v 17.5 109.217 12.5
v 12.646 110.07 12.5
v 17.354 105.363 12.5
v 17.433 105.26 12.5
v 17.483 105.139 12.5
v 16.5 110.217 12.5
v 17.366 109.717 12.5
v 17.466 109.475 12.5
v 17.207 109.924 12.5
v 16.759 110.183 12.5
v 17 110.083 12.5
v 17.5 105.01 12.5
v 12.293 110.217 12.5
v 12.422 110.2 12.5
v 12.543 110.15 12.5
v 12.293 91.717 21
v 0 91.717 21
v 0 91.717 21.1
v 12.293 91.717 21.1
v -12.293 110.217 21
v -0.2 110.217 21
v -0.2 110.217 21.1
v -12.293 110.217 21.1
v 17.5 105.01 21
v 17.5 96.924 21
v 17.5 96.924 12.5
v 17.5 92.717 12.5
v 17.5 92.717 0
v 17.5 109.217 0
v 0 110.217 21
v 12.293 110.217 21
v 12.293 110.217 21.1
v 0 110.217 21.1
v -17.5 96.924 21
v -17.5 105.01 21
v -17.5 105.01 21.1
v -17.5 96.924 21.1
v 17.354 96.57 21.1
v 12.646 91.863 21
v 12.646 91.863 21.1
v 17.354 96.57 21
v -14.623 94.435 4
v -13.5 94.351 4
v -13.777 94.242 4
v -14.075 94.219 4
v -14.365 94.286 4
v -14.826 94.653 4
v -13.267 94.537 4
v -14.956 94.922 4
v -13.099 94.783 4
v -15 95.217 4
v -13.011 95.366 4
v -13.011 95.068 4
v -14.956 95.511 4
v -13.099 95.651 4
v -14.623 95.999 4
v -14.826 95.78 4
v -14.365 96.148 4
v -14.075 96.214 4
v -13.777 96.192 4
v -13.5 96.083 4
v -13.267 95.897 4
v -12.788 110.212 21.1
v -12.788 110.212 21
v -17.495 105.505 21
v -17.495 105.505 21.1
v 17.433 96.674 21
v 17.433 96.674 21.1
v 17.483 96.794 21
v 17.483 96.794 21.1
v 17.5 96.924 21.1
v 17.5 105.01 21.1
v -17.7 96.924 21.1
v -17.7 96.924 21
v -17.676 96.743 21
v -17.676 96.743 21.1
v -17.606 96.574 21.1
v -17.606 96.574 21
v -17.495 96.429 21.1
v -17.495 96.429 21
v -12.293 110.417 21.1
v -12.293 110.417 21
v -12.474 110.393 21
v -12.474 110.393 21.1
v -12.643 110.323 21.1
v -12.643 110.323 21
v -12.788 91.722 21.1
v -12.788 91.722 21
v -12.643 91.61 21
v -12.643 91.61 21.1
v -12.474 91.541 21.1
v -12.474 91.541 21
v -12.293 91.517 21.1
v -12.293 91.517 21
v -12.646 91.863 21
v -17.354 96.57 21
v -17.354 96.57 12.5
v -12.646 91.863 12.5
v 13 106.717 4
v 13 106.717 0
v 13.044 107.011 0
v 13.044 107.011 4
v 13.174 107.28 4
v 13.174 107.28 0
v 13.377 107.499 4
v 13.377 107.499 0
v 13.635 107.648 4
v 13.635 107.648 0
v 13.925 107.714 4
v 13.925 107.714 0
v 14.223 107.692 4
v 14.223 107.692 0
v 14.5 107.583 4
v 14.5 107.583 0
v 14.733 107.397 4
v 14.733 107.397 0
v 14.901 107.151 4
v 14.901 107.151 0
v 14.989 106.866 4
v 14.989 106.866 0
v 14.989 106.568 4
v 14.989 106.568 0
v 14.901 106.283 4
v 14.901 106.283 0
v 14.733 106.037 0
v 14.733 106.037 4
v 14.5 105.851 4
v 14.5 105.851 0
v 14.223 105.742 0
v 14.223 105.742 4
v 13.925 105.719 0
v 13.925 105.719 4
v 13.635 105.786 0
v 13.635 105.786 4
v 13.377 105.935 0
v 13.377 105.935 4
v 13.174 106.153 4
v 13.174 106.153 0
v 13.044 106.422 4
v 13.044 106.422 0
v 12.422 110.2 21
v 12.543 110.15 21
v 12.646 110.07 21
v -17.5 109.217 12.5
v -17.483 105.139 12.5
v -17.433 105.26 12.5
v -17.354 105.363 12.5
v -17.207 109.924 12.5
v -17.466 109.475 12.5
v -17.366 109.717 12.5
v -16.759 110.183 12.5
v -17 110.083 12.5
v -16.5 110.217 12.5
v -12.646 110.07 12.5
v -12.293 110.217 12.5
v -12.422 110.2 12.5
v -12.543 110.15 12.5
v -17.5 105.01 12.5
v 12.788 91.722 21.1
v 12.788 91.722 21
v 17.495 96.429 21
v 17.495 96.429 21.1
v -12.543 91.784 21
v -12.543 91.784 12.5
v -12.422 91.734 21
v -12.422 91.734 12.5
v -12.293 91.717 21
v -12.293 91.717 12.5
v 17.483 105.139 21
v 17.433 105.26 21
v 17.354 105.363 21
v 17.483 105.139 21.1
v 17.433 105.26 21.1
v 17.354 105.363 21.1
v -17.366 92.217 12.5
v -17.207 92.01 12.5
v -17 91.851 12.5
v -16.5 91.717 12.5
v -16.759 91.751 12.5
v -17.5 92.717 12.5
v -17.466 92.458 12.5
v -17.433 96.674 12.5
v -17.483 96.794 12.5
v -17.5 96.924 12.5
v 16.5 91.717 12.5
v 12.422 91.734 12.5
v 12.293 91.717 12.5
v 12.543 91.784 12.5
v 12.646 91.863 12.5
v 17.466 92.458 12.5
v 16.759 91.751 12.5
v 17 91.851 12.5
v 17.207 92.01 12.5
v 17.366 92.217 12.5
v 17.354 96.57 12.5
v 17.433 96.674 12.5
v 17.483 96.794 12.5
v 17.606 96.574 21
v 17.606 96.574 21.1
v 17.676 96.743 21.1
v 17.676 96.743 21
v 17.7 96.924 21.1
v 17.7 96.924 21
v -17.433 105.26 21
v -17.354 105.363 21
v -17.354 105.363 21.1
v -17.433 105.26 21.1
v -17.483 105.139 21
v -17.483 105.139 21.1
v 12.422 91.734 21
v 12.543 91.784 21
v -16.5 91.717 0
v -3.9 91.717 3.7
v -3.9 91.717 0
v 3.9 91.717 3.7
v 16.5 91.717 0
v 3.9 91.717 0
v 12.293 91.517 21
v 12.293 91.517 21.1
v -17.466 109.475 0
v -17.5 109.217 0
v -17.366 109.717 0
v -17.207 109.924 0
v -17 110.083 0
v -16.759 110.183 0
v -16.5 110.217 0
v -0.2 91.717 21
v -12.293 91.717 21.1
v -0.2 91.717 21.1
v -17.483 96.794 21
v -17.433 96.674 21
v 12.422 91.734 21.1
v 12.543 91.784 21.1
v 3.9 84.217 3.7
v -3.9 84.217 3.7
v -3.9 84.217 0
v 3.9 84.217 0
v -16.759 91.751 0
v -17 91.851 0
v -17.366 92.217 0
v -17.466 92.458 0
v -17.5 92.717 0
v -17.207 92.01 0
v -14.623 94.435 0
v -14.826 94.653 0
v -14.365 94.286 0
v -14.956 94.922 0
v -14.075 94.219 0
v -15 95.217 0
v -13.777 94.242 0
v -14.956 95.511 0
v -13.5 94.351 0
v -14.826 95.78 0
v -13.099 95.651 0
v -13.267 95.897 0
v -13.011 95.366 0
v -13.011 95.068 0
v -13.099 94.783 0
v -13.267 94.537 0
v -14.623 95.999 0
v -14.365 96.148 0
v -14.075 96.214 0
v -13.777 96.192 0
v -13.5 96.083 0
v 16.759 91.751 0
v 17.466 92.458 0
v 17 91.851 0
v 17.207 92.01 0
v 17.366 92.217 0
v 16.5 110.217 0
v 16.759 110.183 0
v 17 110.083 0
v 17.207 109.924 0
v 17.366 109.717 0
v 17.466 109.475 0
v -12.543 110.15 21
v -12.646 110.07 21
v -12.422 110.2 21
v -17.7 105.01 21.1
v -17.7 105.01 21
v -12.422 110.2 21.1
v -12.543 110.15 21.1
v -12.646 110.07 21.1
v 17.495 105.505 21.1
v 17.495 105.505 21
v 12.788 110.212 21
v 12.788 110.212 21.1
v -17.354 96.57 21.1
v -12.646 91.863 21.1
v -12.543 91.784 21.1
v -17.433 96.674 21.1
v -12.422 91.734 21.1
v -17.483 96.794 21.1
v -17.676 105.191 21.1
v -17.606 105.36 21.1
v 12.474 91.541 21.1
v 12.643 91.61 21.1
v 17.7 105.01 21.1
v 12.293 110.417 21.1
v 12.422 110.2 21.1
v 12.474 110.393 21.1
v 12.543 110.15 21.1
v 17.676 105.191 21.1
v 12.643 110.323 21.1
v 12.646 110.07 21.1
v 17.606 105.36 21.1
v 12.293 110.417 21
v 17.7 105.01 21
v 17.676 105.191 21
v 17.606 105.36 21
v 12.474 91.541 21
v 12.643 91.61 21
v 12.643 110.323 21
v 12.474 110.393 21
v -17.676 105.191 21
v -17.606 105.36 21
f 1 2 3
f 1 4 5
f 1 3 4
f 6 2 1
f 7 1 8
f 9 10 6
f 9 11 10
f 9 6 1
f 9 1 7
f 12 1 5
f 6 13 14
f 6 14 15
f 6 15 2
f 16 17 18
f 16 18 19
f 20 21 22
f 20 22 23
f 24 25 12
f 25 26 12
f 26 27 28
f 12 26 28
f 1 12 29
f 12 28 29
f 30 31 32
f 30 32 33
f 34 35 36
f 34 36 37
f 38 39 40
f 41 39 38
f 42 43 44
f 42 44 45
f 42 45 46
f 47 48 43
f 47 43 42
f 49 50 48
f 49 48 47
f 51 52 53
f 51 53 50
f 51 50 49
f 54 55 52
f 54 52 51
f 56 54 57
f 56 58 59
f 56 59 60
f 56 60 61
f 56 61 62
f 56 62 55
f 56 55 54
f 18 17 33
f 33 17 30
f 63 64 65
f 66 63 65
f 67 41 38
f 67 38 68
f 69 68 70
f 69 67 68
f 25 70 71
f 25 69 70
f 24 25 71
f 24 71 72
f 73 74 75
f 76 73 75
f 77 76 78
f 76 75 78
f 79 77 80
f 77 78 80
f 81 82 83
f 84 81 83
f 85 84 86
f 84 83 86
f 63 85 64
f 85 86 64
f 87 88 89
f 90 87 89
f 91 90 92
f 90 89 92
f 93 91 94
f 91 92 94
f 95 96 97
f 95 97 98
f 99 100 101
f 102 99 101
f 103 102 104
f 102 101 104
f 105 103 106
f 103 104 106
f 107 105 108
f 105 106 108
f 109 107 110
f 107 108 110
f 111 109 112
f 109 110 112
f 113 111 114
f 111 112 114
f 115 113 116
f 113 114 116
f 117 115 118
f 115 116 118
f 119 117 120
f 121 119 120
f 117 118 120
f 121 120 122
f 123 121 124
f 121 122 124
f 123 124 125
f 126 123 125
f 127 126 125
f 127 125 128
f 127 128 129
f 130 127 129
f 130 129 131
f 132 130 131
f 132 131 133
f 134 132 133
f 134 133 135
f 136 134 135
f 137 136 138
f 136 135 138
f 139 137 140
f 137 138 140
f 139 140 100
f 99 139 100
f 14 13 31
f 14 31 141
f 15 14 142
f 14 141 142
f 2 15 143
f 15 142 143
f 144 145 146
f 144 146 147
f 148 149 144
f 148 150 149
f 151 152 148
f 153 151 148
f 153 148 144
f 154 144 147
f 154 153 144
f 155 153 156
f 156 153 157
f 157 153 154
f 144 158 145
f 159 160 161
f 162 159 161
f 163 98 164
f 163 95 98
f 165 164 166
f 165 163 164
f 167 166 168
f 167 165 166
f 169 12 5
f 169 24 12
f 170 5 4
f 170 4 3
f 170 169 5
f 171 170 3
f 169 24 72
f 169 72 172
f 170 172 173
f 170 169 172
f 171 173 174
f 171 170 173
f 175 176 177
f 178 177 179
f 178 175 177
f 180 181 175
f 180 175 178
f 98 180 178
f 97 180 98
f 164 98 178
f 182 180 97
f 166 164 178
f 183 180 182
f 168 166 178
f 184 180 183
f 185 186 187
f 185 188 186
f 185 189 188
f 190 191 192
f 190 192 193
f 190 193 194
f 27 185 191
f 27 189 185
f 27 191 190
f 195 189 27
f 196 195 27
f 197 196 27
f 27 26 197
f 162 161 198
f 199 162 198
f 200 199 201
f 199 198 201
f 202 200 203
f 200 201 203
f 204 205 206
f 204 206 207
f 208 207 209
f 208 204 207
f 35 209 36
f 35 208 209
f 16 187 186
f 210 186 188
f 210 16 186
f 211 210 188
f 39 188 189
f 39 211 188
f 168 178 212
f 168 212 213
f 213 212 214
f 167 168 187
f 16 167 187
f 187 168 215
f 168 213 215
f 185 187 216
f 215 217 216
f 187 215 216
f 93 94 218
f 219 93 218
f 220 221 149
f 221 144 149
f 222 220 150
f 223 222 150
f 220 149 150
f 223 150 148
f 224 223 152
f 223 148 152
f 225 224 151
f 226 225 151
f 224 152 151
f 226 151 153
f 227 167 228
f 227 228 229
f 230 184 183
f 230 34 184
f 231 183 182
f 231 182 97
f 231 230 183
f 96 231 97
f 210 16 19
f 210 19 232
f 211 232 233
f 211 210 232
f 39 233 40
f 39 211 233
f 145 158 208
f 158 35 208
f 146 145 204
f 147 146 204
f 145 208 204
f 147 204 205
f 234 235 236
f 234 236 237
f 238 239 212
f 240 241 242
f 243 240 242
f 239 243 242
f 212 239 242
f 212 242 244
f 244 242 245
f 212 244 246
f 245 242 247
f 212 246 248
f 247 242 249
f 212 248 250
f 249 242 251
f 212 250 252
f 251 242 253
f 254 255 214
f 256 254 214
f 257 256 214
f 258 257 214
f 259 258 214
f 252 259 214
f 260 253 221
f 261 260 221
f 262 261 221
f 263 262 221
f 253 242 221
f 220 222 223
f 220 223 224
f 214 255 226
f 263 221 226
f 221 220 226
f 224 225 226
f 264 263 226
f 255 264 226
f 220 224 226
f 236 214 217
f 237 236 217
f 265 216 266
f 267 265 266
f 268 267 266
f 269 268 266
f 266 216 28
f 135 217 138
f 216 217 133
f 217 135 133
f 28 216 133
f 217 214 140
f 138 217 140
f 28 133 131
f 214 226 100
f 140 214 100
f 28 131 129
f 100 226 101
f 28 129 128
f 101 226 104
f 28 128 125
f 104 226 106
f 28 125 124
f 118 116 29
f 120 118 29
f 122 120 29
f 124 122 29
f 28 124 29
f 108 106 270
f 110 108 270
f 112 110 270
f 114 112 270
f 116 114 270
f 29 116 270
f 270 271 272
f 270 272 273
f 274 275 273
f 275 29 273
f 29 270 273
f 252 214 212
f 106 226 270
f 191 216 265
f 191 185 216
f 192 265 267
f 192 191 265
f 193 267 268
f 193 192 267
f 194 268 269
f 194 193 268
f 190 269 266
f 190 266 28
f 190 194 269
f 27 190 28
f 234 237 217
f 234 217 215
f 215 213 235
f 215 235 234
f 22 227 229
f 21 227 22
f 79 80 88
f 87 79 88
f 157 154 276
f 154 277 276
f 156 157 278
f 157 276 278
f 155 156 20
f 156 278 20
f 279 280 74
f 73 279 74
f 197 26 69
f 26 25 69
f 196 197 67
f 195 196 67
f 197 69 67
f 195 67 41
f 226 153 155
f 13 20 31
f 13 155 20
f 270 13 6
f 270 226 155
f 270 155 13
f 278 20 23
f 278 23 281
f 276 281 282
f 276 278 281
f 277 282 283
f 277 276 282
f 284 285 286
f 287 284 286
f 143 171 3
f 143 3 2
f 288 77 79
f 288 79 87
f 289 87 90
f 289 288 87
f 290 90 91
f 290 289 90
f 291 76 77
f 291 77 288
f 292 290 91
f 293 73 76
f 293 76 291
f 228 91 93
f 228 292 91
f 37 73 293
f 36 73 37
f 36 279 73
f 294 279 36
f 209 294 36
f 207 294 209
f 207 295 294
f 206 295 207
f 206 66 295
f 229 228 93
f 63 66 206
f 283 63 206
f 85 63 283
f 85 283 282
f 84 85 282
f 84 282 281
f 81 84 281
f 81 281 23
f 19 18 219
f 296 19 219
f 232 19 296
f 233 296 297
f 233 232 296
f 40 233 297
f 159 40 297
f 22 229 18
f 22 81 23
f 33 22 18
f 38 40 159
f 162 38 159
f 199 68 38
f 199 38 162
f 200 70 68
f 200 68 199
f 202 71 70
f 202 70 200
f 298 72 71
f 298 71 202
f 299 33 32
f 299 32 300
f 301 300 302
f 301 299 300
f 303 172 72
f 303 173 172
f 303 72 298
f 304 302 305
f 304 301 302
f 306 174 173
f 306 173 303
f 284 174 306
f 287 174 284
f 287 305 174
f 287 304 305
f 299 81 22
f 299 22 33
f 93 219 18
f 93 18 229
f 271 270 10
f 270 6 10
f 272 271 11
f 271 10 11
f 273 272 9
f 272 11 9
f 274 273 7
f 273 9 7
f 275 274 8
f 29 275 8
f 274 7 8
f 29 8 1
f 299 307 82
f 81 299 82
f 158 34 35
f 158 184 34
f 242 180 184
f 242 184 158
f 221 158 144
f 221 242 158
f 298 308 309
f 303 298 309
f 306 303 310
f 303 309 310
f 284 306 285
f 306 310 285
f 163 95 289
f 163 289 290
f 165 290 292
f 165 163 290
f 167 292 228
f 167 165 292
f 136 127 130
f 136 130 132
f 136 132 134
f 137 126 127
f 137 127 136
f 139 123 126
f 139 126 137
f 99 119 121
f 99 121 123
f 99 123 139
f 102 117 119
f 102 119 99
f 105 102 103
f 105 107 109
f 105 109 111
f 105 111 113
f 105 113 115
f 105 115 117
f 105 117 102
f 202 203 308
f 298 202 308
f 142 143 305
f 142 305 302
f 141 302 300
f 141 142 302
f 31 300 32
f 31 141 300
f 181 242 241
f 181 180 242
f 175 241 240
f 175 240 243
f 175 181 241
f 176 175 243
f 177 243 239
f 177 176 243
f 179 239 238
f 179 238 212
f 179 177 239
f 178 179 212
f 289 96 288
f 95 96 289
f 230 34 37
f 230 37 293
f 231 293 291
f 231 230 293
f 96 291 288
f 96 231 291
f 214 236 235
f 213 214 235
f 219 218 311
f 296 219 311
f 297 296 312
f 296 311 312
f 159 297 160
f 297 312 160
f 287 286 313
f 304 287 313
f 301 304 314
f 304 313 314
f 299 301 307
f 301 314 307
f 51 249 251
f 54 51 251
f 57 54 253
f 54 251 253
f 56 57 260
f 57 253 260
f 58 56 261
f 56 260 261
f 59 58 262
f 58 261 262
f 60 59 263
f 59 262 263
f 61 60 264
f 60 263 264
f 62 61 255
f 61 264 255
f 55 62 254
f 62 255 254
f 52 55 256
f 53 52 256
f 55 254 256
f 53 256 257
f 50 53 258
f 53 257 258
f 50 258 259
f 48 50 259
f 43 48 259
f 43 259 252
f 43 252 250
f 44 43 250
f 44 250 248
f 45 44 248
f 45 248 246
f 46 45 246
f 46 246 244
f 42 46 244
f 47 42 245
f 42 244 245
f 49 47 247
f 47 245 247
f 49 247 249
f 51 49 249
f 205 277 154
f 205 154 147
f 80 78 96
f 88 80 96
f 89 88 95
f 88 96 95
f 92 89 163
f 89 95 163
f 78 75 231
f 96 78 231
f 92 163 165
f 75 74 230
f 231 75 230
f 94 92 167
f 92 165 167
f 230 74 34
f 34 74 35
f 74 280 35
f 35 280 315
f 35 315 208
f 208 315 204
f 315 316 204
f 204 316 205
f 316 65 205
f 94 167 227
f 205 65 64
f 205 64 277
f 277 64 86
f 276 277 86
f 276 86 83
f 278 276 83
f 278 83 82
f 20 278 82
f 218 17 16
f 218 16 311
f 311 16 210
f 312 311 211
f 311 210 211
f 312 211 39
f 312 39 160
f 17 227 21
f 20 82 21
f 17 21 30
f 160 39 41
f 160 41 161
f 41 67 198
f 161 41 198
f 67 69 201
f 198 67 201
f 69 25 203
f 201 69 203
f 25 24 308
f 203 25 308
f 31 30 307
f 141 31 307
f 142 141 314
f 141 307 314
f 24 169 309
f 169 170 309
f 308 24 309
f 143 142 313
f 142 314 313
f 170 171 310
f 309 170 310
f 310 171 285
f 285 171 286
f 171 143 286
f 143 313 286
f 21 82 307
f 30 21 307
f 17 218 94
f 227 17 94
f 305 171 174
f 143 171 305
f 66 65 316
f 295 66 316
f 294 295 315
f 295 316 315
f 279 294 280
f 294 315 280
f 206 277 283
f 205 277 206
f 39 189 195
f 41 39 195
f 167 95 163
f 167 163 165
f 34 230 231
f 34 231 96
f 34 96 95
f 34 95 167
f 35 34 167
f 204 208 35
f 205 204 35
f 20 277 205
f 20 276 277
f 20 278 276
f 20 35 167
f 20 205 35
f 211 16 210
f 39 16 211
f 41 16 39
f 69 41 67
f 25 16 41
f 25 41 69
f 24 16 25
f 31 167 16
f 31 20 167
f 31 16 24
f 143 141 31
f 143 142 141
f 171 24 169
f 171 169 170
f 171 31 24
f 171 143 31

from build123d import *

# Parameters (mm, degrees)
SKETCH_1_W          = 35
SKETCH_1_H          = 18.5
EXTRUDE_1_DEPTH     = 12.5
EXTRUDE_2_DEPTH     = 8.5
FILLET_1_R          = 1
FILLET_2_R          = 0.5
SKETCH_3_R          = 1
CUT_EXTRUDE_1_DEPTH = 4
SKETCH_4_W          = 7.8
SKETCH_4_H          = 3.7
EXTRUDE_3_DEPTH     = 7.5
SKETCH_5_W          = 0.2
SKETCH_5_H          = 18.5
EXTRUDE_3_2_DEPTH   = 0.1


with BuildPart() as part:
    # 草图1 → 凸台-拉伸1 (new body)
    with BuildSketch(Plane.XY):
        with Locations((0, 100.966677277)):
            Rectangle(SKETCH_1_W, SKETCH_1_H)
    extrude(amount=EXTRUDE_1_DEPTH)

    # 草图2 → 凸台-拉伸2 (add)
    with BuildSketch(Plane.XY.offset(12.5)):
        Polygon((-12.5, 110.216677277), (-17.5, 105.216677277), (-17.5, 96.716677277), (-12.5, 91.716677277), (12.5, 91.716677277), (17.5, 96.716677277), (17.5, 105.216677277), (12.5, 110.216677277), align=None)
    extrude(amount=EXTRUDE_2_DEPTH)

    # 圆角1
    fillet_1_edges = [part.edges().sort_by_distance(p)[0] for p in [
        (-17.5, 110.216677277, 6.25),
        (17.5, 110.216677277, 6.25),
        (17.5, 91.716677277, 6.25),
        (-17.5, 91.716677277, 6.25),
    ]]
    fillet(fillet_1_edges, radius=FILLET_1_R)

    # 圆角2
    fillet_2_edges = [part.edges().sort_by_distance(p)[0] for p in [
        (-17.5, 105.216677277, 16.75),
        (-17.5, 96.716677277, 16.75),
        (-12.5, 91.716677277, 16.75),
        (12.5, 91.716677277, 16.75),
        (17.5, 96.716677277, 16.75),
        (17.5, 105.216677277, 16.75),
        (12.5, 110.216677277, 16.75),
        (-12.5, 110.216677277, 16.75),
    ]]
    fillet(fillet_2_edges, radius=FILLET_2_R)

    # 草图3 → 切除-拉伸1 (cut)
    with BuildSketch(Plane(origin=(0, 0, 0), x_dir=(-1, 0, 0), z_dir=(0, 0, -1))):
        with Locations((14, 95.216677277)):
            Circle(SKETCH_3_R)
        with Locations((-14, 106.716677277)):
            Circle(SKETCH_3_R)
    extrude(amount=-CUT_EXTRUDE_1_DEPTH, mode=Mode.SUBTRACT)

    # 草图4 → Extrude 3 (add)
    with BuildSketch(Plane.XZ.offset(-91.716677277)):
        with Locations((0, 1.85)):
            Rectangle(SKETCH_4_W, SKETCH_4_H)
    extrude(amount=EXTRUDE_3_DEPTH)


with BuildPart() as body_2:
    # 草图5 → Extrude 3 2 (new body)
    # profile 1 of 2: a face of its own
    with BuildSketch(Plane.XY.offset(21)):
        with BuildLine():
            Line((12.787867966, 91.721702531), (17.494974747, 96.428809312))
            ThreePointArc((17.494974747, 96.428809312), (17.646715673, 96.655905656), (17.7, 96.923784059))
            Line((17.7, 96.923784059), (17.7, 105.009570496))
            ThreePointArc((17.7, 105.009570496), (17.646715673, 105.277448899), (17.494974747, 105.504545243))
            Line((17.494974747, 105.504545243), (12.787867966, 110.211652024))
            ThreePointArc((12.787867966, 110.211652024), (12.560771621, 110.36339295), (12.292893219, 110.416677277))
            Line((12.292893219, 110.416677277), (-12.292893219, 110.416677277))
            ThreePointArc((-12.292893219, 110.416677277), (-12.560771621, 110.36339295), (-12.787867966, 110.211652024))
            Line((-12.787867966, 110.211652024), (-17.494974747, 105.504545243))
            ThreePointArc((-17.494974747, 105.504545243), (-17.646715673, 105.277448899), (-17.7, 105.009570496))
            Line((-17.7, 105.009570496), (-17.7, 96.923784059))
            ThreePointArc((-17.7, 96.923784059), (-17.646715673, 96.655905656), (-17.494974747, 96.428809312))
            Line((-17.494974747, 96.428809312), (-12.787867966, 91.721702531))
            ThreePointArc((-12.787867966, 91.721702531), (-12.560771621, 91.569961605), (-12.292893219, 91.516677277))
            Line((-12.292893219, 91.516677277), (12.292893219, 91.516677277))
            ThreePointArc((12.292893219, 91.516677277), (12.560771621, 91.569961605), (12.787867966, 91.721702531))
        make_face()
        with BuildLine():
            Line((12.646446609, 91.863123887), (17.353553391, 96.570230668))
            ThreePointArc((17.353553391, 96.570230668), (17.461939766, 96.732442342), (17.5, 96.923784059))
            Line((17.5, 96.923784059), (17.5, 105.009570496))
            ThreePointArc((17.5, 105.009570496), (17.461939766, 105.200912212), (17.353553391, 105.363123887))
            Line((17.353553391, 105.363123887), (12.646446609, 110.070230668))
            ThreePointArc((12.646446609, 110.070230668), (12.484234935, 110.178617044), (12.292893219, 110.216677277))
            Line((12.292893219, 110.216677277), (-12.292893219, 110.216677277))
            ThreePointArc((-12.292893219, 110.216677277), (-12.484234935, 110.178617044), (-12.646446609, 110.070230668))
            Line((-12.646446609, 110.070230668), (-17.353553391, 105.363123887))
            ThreePointArc((-17.353553391, 105.363123887), (-17.461939766, 105.200912212), (-17.5, 105.009570496))
            Line((-17.5, 105.009570496), (-17.5, 96.923784059))
            ThreePointArc((-17.5, 96.923784059), (-17.461939766, 96.732442342), (-17.353553391, 96.570230668))
            Line((-17.353553391, 96.570230668), (-12.646446609, 91.863123887))
            ThreePointArc((-12.646446609, 91.863123887), (-12.484234935, 91.754737511), (-12.292893219, 91.716677277))
            Line((-12.292893219, 91.716677277), (12.292893219, 91.716677277))
            ThreePointArc((12.292893219, 91.716677277), (12.484234935, 91.754737511), (12.646446609, 91.863123887))
        make_face(mode=Mode.SUBTRACT)
    # profile 2 of 2: a face of its own
    with BuildSketch(Plane.XY.offset(21)):
        with Locations((-0.1, 100.966677277)):
            Rectangle(SKETCH_5_W, SKETCH_5_H)
    extrude(amount=EXTRUDE_3_2_DEPTH)


solid = Compound([part.part, body_2.part])
